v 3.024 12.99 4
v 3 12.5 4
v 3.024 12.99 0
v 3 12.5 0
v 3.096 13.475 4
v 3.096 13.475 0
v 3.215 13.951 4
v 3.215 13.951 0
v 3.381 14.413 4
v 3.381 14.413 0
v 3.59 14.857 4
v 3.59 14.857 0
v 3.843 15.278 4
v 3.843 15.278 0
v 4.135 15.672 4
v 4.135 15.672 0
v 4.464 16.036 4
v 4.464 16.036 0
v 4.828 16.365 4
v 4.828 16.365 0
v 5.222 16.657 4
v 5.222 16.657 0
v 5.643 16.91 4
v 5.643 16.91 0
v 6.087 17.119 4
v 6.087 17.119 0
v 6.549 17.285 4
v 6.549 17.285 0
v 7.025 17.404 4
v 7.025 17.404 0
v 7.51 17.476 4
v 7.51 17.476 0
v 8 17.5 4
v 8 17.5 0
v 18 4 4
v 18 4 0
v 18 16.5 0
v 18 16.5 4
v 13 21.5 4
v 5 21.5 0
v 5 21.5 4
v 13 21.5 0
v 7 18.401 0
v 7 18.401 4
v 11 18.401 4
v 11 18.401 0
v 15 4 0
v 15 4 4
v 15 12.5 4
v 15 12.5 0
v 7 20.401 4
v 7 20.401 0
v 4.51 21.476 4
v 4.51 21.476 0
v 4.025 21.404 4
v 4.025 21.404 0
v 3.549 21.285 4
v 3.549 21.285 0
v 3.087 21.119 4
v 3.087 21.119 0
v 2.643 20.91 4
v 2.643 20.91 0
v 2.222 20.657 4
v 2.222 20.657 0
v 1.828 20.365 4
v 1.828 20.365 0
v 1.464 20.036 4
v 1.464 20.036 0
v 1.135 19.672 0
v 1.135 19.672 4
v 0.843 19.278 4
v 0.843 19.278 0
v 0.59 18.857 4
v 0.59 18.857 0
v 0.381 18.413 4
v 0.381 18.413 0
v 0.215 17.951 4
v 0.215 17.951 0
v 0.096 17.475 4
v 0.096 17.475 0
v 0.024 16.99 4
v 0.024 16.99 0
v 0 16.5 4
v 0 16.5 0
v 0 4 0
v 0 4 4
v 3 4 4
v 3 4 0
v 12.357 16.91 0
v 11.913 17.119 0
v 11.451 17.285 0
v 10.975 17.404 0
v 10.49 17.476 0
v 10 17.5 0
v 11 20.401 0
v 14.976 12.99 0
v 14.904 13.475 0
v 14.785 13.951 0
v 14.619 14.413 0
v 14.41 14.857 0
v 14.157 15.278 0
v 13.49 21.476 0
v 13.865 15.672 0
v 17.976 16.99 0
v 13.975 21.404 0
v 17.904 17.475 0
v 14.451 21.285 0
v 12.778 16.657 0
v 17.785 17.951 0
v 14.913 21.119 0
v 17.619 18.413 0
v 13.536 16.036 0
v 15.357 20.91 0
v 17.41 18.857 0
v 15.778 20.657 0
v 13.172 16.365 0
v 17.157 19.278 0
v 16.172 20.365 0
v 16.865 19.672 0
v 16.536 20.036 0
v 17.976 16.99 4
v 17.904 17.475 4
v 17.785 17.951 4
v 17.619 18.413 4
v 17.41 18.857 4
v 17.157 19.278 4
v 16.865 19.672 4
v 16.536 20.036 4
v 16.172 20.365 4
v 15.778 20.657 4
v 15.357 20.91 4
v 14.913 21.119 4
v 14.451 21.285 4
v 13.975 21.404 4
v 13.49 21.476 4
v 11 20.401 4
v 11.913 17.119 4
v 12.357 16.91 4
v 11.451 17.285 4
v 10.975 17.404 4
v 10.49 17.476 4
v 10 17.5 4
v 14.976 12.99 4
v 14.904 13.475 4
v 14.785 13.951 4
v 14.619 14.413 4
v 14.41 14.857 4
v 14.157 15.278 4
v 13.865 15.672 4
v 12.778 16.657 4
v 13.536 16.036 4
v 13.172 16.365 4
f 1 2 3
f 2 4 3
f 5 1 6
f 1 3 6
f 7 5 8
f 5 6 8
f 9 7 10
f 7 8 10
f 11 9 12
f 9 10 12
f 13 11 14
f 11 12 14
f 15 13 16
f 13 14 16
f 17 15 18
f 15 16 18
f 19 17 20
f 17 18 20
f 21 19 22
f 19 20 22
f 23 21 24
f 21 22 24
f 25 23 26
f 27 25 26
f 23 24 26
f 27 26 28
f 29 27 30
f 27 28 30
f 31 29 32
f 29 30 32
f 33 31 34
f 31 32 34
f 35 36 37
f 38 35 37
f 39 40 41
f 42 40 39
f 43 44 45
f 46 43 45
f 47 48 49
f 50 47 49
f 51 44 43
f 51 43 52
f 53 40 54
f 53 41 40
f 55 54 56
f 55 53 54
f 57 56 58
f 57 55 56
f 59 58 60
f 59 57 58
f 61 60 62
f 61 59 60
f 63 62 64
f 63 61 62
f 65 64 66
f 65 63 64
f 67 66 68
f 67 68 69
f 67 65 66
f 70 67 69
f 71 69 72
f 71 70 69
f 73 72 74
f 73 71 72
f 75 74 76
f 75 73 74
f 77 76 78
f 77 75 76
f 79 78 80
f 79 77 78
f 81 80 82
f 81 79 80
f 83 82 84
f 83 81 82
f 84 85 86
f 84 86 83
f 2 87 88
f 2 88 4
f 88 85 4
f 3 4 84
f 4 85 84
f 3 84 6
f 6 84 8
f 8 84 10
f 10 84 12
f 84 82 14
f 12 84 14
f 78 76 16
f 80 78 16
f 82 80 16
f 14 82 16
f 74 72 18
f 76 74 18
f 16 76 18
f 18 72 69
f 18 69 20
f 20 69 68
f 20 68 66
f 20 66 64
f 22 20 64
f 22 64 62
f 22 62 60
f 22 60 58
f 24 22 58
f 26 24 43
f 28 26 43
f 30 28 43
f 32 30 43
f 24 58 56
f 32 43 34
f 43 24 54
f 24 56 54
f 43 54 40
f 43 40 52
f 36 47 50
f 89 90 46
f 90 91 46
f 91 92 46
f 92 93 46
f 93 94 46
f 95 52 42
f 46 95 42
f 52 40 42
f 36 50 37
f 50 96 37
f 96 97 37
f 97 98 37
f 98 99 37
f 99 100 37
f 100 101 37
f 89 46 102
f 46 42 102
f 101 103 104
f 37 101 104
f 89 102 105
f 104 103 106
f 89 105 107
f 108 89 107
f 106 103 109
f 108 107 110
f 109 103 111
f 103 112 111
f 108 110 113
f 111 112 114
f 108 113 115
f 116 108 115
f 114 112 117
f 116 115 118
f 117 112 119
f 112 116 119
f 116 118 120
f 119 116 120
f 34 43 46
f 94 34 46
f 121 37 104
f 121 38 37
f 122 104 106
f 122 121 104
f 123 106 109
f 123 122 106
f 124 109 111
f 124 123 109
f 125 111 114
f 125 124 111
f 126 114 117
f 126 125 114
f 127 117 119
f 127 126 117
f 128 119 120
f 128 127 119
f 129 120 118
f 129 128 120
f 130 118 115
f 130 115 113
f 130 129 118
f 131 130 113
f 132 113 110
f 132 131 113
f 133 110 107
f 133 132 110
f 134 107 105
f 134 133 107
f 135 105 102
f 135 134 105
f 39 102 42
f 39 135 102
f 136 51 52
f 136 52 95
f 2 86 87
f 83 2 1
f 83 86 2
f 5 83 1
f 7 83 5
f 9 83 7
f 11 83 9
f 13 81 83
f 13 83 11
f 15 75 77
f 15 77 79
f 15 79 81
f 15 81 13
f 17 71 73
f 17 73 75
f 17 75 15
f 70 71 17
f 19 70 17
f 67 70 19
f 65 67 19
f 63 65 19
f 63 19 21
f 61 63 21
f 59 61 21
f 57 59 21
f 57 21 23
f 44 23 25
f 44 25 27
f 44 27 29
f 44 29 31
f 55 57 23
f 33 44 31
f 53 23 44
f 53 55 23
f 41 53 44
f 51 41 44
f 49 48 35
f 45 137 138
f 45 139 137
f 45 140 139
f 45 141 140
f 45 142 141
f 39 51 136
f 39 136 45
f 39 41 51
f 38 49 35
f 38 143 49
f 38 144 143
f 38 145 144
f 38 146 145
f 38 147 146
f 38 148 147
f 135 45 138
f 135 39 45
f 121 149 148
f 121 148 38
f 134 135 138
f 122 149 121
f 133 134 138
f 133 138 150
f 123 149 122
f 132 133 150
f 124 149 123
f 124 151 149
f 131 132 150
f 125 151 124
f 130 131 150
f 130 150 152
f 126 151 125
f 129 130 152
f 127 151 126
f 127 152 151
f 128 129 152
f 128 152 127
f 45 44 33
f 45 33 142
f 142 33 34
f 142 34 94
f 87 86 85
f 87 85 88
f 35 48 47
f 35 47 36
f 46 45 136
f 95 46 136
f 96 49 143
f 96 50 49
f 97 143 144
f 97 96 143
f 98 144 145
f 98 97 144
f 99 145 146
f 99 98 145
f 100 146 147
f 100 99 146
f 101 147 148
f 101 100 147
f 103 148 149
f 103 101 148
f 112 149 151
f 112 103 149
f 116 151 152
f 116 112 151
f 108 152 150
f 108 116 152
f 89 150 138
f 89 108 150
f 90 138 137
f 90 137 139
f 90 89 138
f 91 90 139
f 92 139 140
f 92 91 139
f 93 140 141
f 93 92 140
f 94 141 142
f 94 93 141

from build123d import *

# Parameters (mm, degrees)
SKETCH_2_W          = 18
SKETCH_2_H          = 21.5
EXTRUDE_1_DEPTH     = 4
SKETCH_3_W          = 12
SKETCH_3_H          = 17.5
CUT_EXTRUDE_1_DEPTH = 29.324018077
FILLET_1_R          = 5
FILLET_2_R          = 5
SKETCH_4_W          = 4
SKETCH_4_H          = 2
CUT_EXTRUDE_2_DEPTH = 29.324018077
SKETCH_8_W          = 3
SKETCH_8_H          = 4
CUT_EXTRUDE_5_DEPTH = 29.324018077


with BuildPart() as part:
    # ｽｹｯﾁ2 → ﾎﾞｽ - 押し出し1 (new body)
    with BuildSketch(Plane.XY):
        with Locations((9, 10.75)):
            Rectangle(SKETCH_2_W, SKETCH_2_H)
    extrude(amount=EXTRUDE_1_DEPTH)

    # ｽｹｯﾁ3 → ｶｯﾄ - 押し出し1 (cut, through all)
    with BuildSketch(Plane.XY.offset(4)):
        with Locations((9, 8.75)):
            Rectangle(SKETCH_3_W, SKETCH_3_H)
    extrude(amount=-CUT_EXTRUDE_1_DEPTH, mode=Mode.SUBTRACT)

    # ﾌｨﾚｯﾄ1
    fillet_1_edges = [part.edges().sort_by_distance(p)[0] for p in [
        (3, 17.5, 2),
        (15, 17.5, 2),
    ]]
    fillet(fillet_1_edges, radius=FILLET_1_R)

    # ﾌｨﾚｯﾄ2
    fillet_2_edges = [part.edges().sort_by_distance(p)[0] for p in [
        (0, 21.5, 2),
        (18, 21.5, 2),
    ]]
    fillet(fillet_2_edges, radius=FILLET_2_R)

    # ｽｹｯﾁ4 → ｶｯﾄ - 押し出し2 (cut, through all)
    with BuildSketch(Plane.XY.offset(4)):
        with Locations((9, 19.400947982)):
            Rectangle(SKETCH_4_W, SKETCH_4_H)
    extrude(amount=-CUT_EXTRUDE_2_DEPTH, mode=Mode.SUBTRACT)

    # ｽｹｯﾁ8 → ｶｯﾄ - 押し出し5 (cut, through all)
    with BuildSketch(Plane.XY.offset(4)):
        with Locations((1.5, 2)):
            Rectangle(SKETCH_8_W, SKETCH_8_H)
        with Locations((16.5, 2)):
            Rectangle(SKETCH_8_W, SKETCH_8_H)
    extrude(amount=-CUT_EXTRUDE_5_DEPTH, mode=Mode.SUBTRACT)


solid = part.part
